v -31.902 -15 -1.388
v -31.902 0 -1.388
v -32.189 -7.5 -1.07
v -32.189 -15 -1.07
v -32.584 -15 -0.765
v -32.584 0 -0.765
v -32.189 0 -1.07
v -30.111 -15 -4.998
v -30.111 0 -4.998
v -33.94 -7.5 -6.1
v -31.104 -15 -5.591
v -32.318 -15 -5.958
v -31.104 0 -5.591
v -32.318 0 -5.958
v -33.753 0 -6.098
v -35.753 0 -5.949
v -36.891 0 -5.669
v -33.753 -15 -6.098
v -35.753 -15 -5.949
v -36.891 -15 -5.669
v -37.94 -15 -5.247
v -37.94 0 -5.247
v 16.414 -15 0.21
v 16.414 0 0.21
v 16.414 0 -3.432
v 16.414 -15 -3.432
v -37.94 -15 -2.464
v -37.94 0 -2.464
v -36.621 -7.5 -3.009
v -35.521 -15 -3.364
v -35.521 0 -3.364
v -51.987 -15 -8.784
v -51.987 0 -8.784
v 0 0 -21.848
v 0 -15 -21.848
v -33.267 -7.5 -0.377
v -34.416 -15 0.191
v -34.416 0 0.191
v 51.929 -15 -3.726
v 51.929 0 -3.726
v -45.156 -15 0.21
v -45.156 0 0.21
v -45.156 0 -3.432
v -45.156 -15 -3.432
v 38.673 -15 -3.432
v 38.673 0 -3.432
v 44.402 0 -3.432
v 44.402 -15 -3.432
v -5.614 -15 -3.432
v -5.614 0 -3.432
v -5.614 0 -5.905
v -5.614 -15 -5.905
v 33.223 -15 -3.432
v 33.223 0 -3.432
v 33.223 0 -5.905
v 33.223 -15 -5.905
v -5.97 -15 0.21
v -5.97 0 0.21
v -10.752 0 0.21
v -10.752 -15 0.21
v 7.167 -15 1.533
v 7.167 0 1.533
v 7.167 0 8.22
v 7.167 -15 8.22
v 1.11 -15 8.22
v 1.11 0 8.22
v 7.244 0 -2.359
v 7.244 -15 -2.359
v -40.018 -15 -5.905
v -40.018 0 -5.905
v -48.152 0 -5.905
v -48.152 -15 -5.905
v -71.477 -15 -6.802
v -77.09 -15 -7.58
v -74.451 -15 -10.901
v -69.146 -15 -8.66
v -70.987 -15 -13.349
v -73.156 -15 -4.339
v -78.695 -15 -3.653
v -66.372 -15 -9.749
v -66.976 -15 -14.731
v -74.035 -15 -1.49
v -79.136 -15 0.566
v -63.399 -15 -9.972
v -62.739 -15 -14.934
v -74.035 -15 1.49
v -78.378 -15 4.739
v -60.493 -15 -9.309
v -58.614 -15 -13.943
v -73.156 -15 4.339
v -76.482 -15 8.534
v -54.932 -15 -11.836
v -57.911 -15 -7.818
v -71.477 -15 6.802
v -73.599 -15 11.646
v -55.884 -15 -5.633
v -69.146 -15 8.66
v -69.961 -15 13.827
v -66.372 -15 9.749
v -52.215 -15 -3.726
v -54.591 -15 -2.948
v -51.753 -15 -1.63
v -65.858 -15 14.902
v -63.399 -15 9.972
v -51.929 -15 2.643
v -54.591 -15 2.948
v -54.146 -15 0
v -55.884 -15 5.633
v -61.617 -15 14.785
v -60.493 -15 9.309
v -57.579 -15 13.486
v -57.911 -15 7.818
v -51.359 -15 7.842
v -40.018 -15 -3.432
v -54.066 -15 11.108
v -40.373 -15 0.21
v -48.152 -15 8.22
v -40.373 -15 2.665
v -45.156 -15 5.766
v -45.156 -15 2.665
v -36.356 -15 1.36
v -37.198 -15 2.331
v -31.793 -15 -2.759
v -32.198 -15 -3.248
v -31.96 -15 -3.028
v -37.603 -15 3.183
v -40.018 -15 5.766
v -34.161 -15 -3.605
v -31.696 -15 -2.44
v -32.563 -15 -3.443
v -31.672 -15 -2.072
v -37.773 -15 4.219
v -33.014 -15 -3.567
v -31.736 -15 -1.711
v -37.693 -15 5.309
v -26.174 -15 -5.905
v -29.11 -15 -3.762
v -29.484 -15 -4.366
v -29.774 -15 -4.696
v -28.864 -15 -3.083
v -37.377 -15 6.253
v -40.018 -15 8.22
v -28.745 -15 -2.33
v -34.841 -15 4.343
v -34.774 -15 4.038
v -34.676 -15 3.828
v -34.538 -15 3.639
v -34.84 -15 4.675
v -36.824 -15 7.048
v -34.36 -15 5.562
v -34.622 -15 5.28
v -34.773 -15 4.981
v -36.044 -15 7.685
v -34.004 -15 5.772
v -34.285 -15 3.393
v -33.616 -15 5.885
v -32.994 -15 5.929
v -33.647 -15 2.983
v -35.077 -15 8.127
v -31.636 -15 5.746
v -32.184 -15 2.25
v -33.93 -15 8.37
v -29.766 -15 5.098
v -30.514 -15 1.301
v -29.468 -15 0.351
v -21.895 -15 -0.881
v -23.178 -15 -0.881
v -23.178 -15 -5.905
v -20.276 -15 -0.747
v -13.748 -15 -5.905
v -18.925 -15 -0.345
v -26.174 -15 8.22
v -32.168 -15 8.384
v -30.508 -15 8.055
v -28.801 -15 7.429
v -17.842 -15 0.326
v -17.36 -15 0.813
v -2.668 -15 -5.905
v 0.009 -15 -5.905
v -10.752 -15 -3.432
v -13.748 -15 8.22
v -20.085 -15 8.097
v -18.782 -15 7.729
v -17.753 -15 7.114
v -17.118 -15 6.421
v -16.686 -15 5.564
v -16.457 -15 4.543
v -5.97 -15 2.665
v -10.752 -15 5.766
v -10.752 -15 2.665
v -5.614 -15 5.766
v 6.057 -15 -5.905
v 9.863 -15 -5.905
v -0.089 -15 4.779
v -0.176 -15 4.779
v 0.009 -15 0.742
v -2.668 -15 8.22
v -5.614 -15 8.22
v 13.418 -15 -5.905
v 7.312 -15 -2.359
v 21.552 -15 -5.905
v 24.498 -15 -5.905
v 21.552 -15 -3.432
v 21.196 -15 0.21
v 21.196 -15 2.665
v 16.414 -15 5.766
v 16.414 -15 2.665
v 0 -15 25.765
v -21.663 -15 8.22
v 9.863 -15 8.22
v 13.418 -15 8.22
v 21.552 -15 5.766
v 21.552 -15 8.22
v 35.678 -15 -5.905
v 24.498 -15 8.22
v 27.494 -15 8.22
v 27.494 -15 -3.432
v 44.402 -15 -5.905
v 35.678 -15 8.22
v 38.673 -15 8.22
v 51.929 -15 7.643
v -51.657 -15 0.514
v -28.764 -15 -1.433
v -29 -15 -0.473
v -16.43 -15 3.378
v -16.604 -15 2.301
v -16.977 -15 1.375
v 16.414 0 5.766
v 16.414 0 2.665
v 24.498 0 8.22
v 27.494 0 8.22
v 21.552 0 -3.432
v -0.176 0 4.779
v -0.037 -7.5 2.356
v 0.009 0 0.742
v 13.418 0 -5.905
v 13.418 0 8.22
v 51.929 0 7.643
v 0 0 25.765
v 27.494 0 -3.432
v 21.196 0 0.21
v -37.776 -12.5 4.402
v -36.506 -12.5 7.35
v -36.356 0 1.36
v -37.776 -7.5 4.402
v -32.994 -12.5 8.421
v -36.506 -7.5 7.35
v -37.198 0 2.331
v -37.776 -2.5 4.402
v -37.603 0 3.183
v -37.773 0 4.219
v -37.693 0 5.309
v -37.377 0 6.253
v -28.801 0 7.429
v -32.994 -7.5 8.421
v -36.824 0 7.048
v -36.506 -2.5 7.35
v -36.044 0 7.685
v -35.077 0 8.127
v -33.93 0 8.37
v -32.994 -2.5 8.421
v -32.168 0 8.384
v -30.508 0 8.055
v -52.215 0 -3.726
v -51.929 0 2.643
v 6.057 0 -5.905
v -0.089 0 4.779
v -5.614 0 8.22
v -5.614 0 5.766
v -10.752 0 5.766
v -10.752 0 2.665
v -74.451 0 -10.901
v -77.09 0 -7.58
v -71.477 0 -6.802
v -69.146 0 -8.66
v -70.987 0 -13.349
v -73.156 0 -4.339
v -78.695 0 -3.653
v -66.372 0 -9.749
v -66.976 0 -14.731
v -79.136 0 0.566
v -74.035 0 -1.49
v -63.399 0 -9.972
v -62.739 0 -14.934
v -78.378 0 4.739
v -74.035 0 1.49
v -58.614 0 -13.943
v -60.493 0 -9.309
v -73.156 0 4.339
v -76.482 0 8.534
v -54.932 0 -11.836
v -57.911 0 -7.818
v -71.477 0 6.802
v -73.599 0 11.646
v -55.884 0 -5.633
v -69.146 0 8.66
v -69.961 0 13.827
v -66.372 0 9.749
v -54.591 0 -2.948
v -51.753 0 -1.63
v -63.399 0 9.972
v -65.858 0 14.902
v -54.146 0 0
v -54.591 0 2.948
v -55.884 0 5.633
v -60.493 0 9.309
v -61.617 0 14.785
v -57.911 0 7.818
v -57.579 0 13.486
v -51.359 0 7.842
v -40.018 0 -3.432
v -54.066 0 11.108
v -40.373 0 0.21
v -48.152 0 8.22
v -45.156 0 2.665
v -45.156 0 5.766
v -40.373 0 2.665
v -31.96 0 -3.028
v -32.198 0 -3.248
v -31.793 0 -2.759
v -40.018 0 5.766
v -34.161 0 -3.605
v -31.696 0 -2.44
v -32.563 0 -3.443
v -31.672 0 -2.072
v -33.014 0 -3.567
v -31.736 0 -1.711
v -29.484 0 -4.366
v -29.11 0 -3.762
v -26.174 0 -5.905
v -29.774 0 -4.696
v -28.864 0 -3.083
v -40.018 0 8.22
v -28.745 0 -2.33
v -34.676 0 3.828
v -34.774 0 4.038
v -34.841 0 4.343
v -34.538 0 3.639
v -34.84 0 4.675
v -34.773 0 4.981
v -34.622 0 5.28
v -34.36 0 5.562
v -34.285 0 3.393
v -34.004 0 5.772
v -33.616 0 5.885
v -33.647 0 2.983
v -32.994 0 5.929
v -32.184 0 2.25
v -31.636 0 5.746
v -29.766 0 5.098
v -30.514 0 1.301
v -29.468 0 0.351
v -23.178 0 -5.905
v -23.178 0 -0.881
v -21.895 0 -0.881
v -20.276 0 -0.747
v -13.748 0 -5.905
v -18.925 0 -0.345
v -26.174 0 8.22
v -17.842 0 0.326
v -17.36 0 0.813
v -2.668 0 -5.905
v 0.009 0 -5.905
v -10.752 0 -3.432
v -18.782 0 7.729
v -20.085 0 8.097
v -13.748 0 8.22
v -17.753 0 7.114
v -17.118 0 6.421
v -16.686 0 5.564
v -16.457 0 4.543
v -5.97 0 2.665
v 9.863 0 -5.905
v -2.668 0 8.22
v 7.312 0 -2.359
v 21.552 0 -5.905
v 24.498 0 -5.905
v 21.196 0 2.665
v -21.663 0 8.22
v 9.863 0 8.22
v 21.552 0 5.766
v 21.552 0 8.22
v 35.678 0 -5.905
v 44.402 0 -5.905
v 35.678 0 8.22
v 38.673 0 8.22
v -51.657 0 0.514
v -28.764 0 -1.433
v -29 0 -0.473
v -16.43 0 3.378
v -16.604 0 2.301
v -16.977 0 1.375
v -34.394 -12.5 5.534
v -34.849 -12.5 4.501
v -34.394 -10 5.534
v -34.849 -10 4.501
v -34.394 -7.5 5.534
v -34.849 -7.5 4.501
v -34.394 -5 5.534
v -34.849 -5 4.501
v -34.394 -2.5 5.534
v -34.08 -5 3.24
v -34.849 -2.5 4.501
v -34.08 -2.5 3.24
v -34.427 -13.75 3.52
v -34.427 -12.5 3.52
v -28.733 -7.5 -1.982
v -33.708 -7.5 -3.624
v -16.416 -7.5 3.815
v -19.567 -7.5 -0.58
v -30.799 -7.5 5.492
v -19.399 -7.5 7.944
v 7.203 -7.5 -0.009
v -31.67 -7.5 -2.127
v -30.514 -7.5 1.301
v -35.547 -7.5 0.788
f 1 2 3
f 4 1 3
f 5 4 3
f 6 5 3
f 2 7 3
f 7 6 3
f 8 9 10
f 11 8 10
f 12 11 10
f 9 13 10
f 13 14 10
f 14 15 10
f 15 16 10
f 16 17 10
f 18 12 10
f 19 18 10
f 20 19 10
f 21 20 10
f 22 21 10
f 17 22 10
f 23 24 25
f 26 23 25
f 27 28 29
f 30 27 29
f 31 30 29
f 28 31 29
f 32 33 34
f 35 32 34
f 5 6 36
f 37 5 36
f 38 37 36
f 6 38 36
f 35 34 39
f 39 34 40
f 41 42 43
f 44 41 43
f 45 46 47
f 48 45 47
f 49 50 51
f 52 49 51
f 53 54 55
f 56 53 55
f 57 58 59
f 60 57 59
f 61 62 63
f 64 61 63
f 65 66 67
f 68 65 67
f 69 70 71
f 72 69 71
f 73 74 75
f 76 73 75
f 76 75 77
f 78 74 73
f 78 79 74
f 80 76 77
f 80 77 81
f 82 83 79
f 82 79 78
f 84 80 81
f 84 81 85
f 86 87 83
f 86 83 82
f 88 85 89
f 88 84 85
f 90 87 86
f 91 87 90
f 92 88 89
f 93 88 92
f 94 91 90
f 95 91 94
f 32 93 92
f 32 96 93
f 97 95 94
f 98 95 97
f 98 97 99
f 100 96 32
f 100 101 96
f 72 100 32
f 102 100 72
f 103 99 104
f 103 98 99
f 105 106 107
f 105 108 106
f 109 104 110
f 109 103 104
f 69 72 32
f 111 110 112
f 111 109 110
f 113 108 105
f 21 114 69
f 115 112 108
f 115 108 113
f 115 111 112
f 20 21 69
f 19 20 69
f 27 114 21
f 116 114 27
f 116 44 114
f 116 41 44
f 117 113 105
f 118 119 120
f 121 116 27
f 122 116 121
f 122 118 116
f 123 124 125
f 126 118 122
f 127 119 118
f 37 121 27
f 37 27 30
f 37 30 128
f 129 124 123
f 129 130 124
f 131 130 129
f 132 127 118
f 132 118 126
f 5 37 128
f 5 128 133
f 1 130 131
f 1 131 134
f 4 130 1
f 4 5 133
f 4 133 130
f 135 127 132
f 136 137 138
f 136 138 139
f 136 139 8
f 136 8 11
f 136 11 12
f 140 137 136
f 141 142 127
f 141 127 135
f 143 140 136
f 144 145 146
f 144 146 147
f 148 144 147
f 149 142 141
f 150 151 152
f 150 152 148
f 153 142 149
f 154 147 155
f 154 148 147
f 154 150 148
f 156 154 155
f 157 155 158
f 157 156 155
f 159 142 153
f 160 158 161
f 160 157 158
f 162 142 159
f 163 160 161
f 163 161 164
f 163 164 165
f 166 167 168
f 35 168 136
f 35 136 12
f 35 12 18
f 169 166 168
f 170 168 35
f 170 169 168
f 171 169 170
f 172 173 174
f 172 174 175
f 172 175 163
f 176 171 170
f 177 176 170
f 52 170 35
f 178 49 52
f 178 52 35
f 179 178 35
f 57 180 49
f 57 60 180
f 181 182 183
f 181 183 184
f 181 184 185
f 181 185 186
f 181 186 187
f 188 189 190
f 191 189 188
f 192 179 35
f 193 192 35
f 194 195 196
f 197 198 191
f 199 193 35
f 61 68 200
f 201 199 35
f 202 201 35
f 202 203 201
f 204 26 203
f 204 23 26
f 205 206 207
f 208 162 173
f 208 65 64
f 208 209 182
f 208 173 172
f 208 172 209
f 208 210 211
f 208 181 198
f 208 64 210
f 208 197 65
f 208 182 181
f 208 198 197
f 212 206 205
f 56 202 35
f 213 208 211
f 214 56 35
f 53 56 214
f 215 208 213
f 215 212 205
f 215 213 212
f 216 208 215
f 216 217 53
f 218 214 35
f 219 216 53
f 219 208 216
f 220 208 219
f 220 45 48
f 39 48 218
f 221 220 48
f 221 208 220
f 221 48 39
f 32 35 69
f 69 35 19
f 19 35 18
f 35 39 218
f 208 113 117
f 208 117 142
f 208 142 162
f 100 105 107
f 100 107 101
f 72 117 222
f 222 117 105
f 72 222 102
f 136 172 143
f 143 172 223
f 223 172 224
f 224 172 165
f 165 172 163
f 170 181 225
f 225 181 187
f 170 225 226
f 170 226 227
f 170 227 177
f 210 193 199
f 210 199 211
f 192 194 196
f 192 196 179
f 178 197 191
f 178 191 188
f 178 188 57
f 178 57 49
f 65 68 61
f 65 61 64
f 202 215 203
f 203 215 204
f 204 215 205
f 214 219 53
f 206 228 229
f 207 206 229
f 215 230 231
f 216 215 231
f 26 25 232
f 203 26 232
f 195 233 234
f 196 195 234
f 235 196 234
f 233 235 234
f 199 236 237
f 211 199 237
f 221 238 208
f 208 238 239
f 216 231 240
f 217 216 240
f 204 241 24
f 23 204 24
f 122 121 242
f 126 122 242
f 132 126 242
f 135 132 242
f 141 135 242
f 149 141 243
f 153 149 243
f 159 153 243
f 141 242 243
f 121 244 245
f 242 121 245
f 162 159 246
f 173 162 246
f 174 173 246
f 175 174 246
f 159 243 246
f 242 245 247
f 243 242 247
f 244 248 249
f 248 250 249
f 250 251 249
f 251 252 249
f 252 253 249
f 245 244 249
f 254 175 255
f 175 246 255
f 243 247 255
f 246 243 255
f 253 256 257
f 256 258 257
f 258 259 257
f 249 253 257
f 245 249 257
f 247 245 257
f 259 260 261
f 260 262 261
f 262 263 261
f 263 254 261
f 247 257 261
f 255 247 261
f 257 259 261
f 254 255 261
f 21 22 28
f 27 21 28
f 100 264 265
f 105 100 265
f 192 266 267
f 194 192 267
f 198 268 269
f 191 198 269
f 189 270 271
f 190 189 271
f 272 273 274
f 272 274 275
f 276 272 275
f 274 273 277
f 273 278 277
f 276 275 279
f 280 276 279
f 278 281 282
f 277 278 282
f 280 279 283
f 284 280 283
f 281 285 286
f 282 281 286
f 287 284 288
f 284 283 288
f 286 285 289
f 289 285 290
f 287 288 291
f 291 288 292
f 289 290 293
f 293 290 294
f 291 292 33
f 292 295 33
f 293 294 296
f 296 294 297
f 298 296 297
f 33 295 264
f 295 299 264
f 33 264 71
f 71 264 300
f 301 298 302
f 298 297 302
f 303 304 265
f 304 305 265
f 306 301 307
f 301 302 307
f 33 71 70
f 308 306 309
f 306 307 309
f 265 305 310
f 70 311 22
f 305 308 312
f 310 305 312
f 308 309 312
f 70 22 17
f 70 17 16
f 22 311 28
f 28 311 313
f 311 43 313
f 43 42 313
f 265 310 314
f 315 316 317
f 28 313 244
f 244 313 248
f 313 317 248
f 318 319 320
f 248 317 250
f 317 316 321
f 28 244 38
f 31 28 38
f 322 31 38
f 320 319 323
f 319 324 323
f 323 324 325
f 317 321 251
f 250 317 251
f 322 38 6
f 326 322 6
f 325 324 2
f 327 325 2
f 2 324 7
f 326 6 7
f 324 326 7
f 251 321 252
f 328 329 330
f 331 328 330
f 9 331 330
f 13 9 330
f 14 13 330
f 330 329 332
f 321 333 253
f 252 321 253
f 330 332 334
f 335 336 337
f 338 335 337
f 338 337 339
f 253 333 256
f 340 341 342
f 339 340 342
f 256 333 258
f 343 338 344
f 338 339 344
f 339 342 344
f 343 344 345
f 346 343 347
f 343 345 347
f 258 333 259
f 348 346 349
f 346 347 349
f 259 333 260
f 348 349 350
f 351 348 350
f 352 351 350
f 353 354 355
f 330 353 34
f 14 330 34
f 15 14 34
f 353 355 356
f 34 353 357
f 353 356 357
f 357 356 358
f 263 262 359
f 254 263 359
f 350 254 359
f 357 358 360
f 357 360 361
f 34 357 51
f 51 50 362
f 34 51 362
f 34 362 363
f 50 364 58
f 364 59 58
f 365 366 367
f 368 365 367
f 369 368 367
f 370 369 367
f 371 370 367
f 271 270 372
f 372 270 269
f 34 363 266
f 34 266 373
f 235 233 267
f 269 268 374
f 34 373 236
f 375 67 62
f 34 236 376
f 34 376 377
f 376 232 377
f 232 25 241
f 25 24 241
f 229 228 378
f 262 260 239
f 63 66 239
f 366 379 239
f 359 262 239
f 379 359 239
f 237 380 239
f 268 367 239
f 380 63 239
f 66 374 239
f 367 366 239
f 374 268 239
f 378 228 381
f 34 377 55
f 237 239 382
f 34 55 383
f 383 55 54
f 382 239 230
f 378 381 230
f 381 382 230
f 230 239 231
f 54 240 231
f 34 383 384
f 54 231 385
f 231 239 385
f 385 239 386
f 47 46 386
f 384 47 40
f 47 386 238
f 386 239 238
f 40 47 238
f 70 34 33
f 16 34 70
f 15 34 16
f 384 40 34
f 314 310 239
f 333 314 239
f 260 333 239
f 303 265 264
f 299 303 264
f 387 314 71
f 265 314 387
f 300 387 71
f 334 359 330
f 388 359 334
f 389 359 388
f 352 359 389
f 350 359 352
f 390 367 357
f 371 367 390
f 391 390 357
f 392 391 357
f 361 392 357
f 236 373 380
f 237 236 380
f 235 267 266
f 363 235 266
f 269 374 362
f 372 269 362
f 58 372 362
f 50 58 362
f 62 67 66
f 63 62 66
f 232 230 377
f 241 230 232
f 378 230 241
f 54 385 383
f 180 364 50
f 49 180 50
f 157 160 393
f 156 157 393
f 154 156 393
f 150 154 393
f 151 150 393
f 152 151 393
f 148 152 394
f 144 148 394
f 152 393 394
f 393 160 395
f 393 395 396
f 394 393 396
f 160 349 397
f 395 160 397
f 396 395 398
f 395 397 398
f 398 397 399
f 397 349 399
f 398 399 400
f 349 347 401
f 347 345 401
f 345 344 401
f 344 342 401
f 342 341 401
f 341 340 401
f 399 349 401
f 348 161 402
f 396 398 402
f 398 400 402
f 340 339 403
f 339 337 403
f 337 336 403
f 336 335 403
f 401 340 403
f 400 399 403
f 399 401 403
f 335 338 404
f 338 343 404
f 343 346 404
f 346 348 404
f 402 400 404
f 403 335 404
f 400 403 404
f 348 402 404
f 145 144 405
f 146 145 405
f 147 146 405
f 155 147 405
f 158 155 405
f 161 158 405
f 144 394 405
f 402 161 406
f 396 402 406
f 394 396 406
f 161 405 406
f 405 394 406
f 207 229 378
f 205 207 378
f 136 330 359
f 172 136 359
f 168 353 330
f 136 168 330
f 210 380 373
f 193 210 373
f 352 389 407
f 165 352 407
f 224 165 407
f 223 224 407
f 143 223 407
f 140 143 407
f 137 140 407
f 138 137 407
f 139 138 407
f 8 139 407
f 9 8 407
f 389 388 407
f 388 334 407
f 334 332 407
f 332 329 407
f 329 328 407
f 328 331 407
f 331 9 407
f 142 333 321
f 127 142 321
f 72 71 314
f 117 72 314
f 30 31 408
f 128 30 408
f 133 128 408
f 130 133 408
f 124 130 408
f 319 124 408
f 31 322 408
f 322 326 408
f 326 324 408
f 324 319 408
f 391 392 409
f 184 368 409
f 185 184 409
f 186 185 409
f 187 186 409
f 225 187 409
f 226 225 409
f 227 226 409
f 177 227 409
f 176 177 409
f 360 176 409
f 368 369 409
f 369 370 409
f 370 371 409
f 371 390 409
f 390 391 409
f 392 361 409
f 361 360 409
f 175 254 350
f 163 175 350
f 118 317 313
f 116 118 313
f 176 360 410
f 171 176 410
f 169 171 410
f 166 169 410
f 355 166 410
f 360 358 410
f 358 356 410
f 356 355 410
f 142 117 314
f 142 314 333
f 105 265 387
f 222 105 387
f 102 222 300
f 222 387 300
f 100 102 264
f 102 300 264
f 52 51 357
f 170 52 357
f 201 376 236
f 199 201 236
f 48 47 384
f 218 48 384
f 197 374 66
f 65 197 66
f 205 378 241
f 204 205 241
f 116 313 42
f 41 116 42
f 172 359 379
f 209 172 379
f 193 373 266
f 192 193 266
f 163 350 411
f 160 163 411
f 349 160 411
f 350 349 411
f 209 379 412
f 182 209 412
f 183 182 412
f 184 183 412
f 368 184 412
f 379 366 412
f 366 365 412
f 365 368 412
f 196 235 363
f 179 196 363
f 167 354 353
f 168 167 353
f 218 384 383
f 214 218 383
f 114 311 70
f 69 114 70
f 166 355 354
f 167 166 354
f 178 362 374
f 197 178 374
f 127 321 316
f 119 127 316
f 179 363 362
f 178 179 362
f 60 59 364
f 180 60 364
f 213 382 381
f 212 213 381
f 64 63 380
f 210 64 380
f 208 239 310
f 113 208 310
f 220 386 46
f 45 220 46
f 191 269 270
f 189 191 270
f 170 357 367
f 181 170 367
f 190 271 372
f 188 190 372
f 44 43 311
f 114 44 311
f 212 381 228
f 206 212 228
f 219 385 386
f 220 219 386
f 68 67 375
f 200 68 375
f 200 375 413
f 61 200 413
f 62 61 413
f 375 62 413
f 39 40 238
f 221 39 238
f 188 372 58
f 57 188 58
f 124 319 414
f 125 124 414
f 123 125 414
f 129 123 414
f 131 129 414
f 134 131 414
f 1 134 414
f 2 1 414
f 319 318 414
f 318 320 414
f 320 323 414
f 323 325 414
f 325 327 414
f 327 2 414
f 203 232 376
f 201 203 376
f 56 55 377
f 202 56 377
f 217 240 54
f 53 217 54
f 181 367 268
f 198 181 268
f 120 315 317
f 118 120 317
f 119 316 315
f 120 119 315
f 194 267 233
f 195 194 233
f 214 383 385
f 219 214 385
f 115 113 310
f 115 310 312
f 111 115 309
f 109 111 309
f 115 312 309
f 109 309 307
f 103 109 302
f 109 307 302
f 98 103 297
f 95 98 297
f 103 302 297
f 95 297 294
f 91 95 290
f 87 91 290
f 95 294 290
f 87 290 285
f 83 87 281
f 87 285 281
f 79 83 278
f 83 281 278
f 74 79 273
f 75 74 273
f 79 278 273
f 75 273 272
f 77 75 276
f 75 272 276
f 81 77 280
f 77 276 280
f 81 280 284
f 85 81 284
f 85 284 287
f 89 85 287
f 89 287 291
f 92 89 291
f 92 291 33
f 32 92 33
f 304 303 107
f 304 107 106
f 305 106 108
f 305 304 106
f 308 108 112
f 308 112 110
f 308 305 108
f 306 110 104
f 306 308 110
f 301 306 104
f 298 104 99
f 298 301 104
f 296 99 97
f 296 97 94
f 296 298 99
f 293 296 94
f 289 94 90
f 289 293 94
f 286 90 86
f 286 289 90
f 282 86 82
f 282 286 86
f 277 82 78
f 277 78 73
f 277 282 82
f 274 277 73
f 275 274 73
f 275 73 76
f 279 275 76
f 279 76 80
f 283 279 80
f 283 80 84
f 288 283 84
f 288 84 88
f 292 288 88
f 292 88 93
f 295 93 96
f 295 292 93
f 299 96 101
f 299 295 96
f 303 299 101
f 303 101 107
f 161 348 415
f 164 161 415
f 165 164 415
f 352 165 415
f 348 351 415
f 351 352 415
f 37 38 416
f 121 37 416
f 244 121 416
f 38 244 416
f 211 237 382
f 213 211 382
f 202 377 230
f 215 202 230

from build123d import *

# Parameters (mm, degrees)
F0_R     = 10
F1_DEPTH = 15


with BuildPart() as f1:
    # F0 (on Front) → F1 (new body)
    with BuildSketch(Plane.XZ):
        with BuildLine():
            ThreePointArc((-51.9289774608, 2.6432993809), (-51.6588535234, -0.5600733653), (-52.2146643877, -3.726402182))
            Line((-52.2146643877, -3.726402182), (-52.2146643877, -8.726402182))
            Line((-52.2146643877, -8.726402182), (-51.9870151319, -8.7836093454))
            ThreePointArc((-51.9870151319, -8.7836093454), (-49.874136957, -4.6157733907), (-49.1462999327, 0))
            ThreePointArc((-49.1462999327, 0), (-49.7101962212, 4.0741759452), (-51.3594878837, 7.8420301978))
            Line((-51.3594878837, 7.8420301978), (-51.9289774608, 7.6432993809))
            Line((-51.9289774608, 7.6432993809), (-51.9289774608, 2.6432993809))
        make_face()
        with BuildLine():
            Line((-52.2146643877, -8.726402182), (-52.2146643877, -3.726402182))
            Line((-52.2146643877, -3.726402182), (-51.9289774608, 2.6432993809))
            Line((-51.9289774608, 2.6432993809), (-51.9289774608, 7.6432993809))
            Line((-51.9289774608, 7.6432993809), (-51.3594878837, 7.8420301978))
            ThreePointArc((-51.3594878837, 7.8420301978), (-79.1356264541, 0.565765353), (-51.9870151319, -8.7836093454))
            Line((-51.9870151319, -8.7836093454), (-52.2146643877, -8.726402182))
        make_face()
        with Locations((-64.1462999327, 0)):
            Circle(F0_R, mode=Mode.SUBTRACT)
        with BuildLine():
            ThreePointArc((-49.1462999327, 0), (-49.874136957, -4.6157733907), (-51.9870151319, -8.7836093454))
            Line((-51.9870151319, -8.7836093454), (0, -21.8476962826))
            Line((0, -21.8476962826), (51.9289774608, -3.726402182))
            Line((51.9289774608, -3.726402182), (51.9289774608, 7.6432993809))
            Line((51.9289774608, 7.6432993809), (0, 25.7645934815))
            Line((0, 25.7645934815), (-51.3594878837, 7.8420301978))
            ThreePointArc((-51.3594878837, 7.8420301978), (-49.7101962212, 4.0741759452), (-49.1462999327, 0))
        make_face()
        Polygon((-40.0178585444, -3.4319313488), (-40.0178585444, -5.9052360061), (-48.1519392362, -5.9052360061), (-48.1519392362, 8.2204252181), (-40.0178585444, 8.2204252181), (-40.0178585444, 5.7656703457), (-45.15614897, 5.7656703457), (-45.15614897, 2.6647646316), (-40.3733960889, 2.6647646316), (-40.3733960889, 0.2100097592), (-45.15614897, 0.2100097592), (-45.15614897, -3.4319313488), align=None, mode=Mode.SUBTRACT)
        with BuildLine():
            add(Edge.make_bspline(
                [(-29.4676683654, 0.3506789616), (-28.7334060453, -0.5999975161), (-28.7334060453, -1.9819564934)],
                knots=[0, 0, 0, 1, 1, 1], degree=2))
            add(Edge.make_bspline(
                [(-28.7334060453, -1.9819564934), (-28.7334060453, -3.895675972), (-30.1107275763, -4.9978423599)],
                knots=[0, 0, 0, 1, 1, 1], degree=2))
            add(Edge.make_bspline(
                [(-30.1107275763, -4.9978423599), (-31.4880491074, -6.1000087479), (-33.939712349, -6.1000087479)],
                knots=[0, 0, 0, 1, 1, 1], degree=2))
            add(Edge.make_bspline(
                [(-33.939712349, -6.1000087479), (-36.2027861105, -6.1000087479), (-37.9402826322, -5.2467186411)],
                knots=[0, 0, 0, 1, 1, 1], degree=2))
            Line((-37.9402826322, -5.2467186411), (-37.9402826322, -2.4642509016))
            add(Edge.make_bspline(
                [(-37.9402826322, -2.4642509016), (-36.5119491926, -3.1042184817), (-35.5210815143, -3.3639154707)],
                knots=[0, 0, 0, 1, 1, 1], degree=2))
            add(Edge.make_bspline(
                [(-35.5210815143, -3.3639154707), (-34.5302138359, -3.6236124597), (-33.7078400374, -3.6236124597)],
                knots=[0, 0, 0, 1, 1, 1], degree=2))
            add(Edge.make_bspline(
                [(-33.7078400374, -3.6236124597), (-32.7247014361, -3.6236124597), (-32.197578381, -3.2479793149)],
                knots=[0, 0, 0, 1, 1, 1], degree=2))
            add(Edge.make_bspline(
                [(-32.197578381, -3.2479793149), (-31.6704553259, -2.87234617), (-31.6704553259, -2.127263142)],
                knots=[0, 0, 0, 1, 1, 1], degree=2))
            add(Edge.make_bspline(
                [(-31.6704553259, -2.127263142), (-31.6704553259, -1.7129846119), (-31.9023276375, -1.3883633756)],
                knots=[0, 0, 0, 1, 1, 1], degree=2))
            add(Edge.make_bspline(
                [(-31.9023276375, -1.3883633756), (-32.1341999491, -1.0637421394), (-32.5840322337, -0.7653997651)],
                knots=[0, 0, 0, 1, 1, 1], degree=2))
            add(Edge.make_bspline(
                [(-32.5840322337, -0.7653997651), (-33.0338645182, -0.4670573908), (-34.4158234955, 0.1914599742)],
                knots=[0, 0, 0, 1, 1, 1], degree=2))
            add(Edge.make_bspline(
                [(-34.4158234955, 0.1914599742), (-35.708125179, 0.8005112461), (-36.3558218361, 1.3600964248)],
                knots=[0, 0, 0, 1, 1, 1], degree=2))
            add(Edge.make_bspline(
                [(-36.3558218361, 1.3600964248), (-37.0035184933, 1.9196816036), (-37.389972346, 2.6647646316)],
                knots=[0, 0, 0, 1, 1, 1], degree=2))
            add(Edge.make_bspline(
                [(-37.389972346, 2.6647646316), (-37.7764261987, 3.4098476596), (-37.7764261987, 4.4022611534)],
                knots=[0, 0, 0, 1, 1, 1], degree=2))
            add(Edge.make_bspline(
                [(-37.7764261987, 4.4022611534), (-37.7764261987, 6.2788810621), (-36.505765931, 7.3501311418)],
                knots=[0, 0, 0, 1, 1, 1], degree=2))
            add(Edge.make_bspline(
                [(-36.505765931, 7.3501311418), (-35.2351056633, 8.4213812215), (-32.9936733176, 8.4213812215)],
                knots=[0, 0, 0, 1, 1, 1], degree=2))
            add(Edge.make_bspline(
                [(-32.9936733176, 8.4213812215), (-31.893052745, 8.4213812215), (-30.8929101742, 8.1616842325)],
                knots=[0, 0, 0, 1, 1, 1], degree=2))
            add(Edge.make_bspline(
                [(-30.8929101742, 8.1616842325), (-29.8927676034, 7.9019872435), (-28.8014219234, 7.4289677278)],
                knots=[0, 0, 0, 1, 1, 1], degree=2))
            Line((-28.8014219234, 7.4289677278), (-29.7660107397, 5.0978780882))
            add(Edge.make_bspline(
                [(-29.7660107397, 5.0978780882), (-30.8975476205, 5.5616227115), (-31.6364473868, 5.7455747454)],
                knots=[0, 0, 0, 1, 1, 1], degree=2))
            add(Edge.make_bspline(
                [(-31.6364473868, 5.7455747454), (-32.3753471532, 5.9295267793), (-33.089513873, 5.9295267793)],
                knots=[0, 0, 0, 1, 1, 1], degree=2))
            add(Edge.make_bspline(
                [(-33.089513873, 5.9295267793), (-33.939712349, 5.9295267793), (-34.3941820798, 5.5337980341)],
                knots=[0, 0, 0, 1, 1, 1], degree=2))
            add(Edge.make_bspline(
                [(-34.3941820798, 5.5337980341), (-34.8486518106, 5.1380692889), (-34.8486518106, 4.5011933396)],
                knots=[0, 0, 0, 1, 1, 1], degree=2))
            add(Edge.make_bspline(
                [(-34.8486518106, 4.5011933396), (-34.8486518106, 4.1054645945), (-34.6646997767, 3.810213851)],
                knots=[0, 0, 0, 1, 1, 1], degree=2))
            add(Edge.make_bspline(
                [(-34.6646997767, 3.810213851), (-34.4807477428, 3.5149631075), (-34.0803815514, 3.2398079644)],
                knots=[0, 0, 0, 1, 1, 1], degree=2))
            add(Edge.make_bspline(
                [(-34.0803815514, 3.2398079644), (-33.68001536, 2.9646528213), (-32.1836660423, 2.2504861015)],
                knots=[0, 0, 0, 1, 1, 1], degree=2))
            add(Edge.make_bspline(
                [(-32.1836660423, 2.2504861015), (-30.2019306856, 1.3013554392), (-29.4676683654, 0.3506789616)],
                knots=[0, 0, 0, 1, 1, 1], degree=2))
        make_face(mode=Mode.SUBTRACT)
        with BuildLine():
            add(Edge.make_bspline(
                [(-17.7534791821, 7.113621384), (-16.4163488518, 6.0068175498), (-16.4163488518, 3.8148512972)],
                knots=[0, 0, 0, 1, 1, 1], degree=2))
            add(Edge.make_bspline(
                [(-16.4163488518, 3.8148512972), (-16.4163488518, 1.5332277508), (-17.8415906605, 0.325945915)],
                knots=[0, 0, 0, 1, 1, 1], degree=2))
            add(Edge.make_bspline(
                [(-17.8415906605, 0.325945915), (-19.2668324693, -0.8813359209), (-21.8947186678, -0.8813359209)],
                knots=[0, 0, 0, 1, 1, 1], degree=2))
            Line((-21.8947186678, -0.8813359209), (-23.1777454587, -0.8813359209))
            Line((-23.1777454587, -0.8813359209), (-23.1777454587, -5.9052360061))
            Line((-23.1777454587, -5.9052360061), (-26.1735357249, -5.9052360061))
            Line((-26.1735357249, -5.9052360061), (-26.1735357249, 8.2204252181))
            Line((-26.1735357249, 8.2204252181), (-21.6628463561, 8.2204252181))
            add(Edge.make_bspline(
                [(-21.6628463561, 8.2204252181), (-19.0906095125, 8.2204252181), (-17.7534791821, 7.113621384)],
                knots=[0, 0, 0, 1, 1, 1], degree=2))
        make_face(mode=Mode.SUBTRACT)
        Polygon((-5.6141907608, -3.4319313488), (-5.6141907608, -5.9052360061), (-13.7482714526, -5.9052360061), (-13.7482714526, 8.2204252181), (-5.6141907608, 8.2204252181), (-5.6141907608, 5.7656703457), (-10.7524811864, 5.7656703457), (-10.7524811864, 2.6647646316), (-5.9697283053, 2.6647646316), (-5.9697283053, 0.2100097592), (-10.7524811864, 0.2100097592), (-10.7524811864, -3.4319313488), align=None, mode=Mode.SUBTRACT)
        with BuildLine():
            Line((9.8625131325, 8.2204252181), (9.8625131325, -5.9052360061))
            Line((9.8625131325, -5.9052360061), (6.056715591, -5.9052360061))
            Line((6.056715591, -5.9052360061), (-0.0894464825, 4.7794401136))
            Line((-0.0894464825, 4.7794401136), (-0.1760121455, 4.7794401136))
            add(Edge.make_bspline(
                [(-0.1760121455, 4.7794401136), (0.0094857038, 1.9505979118), (0.0094857038, 0.7417702605)],
                knots=[0, 0, 0, 1, 1, 1], degree=2))
            Line((0.0094857038, 0.7417702605), (0.0094857038, -5.9052360061))
            Line((0.0094857038, -5.9052360061), (-2.6678665878, -5.9052360061))
            Line((-2.6678665878, -5.9052360061), (-2.6678665878, 8.2204252181))
            Line((-2.6678665878, 8.2204252181), (1.1101062763, 8.2204252181))
            Line((1.1101062763, 8.2204252181), (7.2439018265, -2.3591354536))
            Line((7.2439018265, -2.3591354536), (7.3119177046, -2.3591354536))
            add(Edge.make_bspline(
                [(7.3119177046, -2.3591354536), (7.166611056, 0.3955076085), (7.166611056, 1.5332277508)],
                knots=[0, 0, 0, 1, 1, 1], degree=2))
            Line((7.166611056, 1.5332277508), (7.166611056, 8.2204252181))
            Line((7.166611056, 8.2204252181), (9.8625131325, 8.2204252181))
        make_face(mode=Mode.SUBTRACT)
        Polygon((21.5519692692, -3.4319313488), (21.5519692692, -5.9052360061), (13.4178885774, -5.9052360061), (13.4178885774, 8.2204252181), (21.5519692692, 8.2204252181), (21.5519692692, 5.7656703457), (16.4136788436, 5.7656703457), (16.4136788436, 2.6647646316), (21.1964317247, 2.6647646316), (21.1964317247, 0.2100097592), (16.4136788436, 0.2100097592), (16.4136788436, -3.4319313488), align=None, mode=Mode.SUBTRACT)
        Polygon((33.222875621, -5.9052360061), (24.4982934423, -5.9052360061), (24.4982934423, 8.2204252181), (27.4940837085, 8.2204252181), (27.4940837085, -3.4319313488), (33.222875621, -3.4319313488), align=None, mode=Mode.SUBTRACT)
        Polygon((44.4022126722, -5.9052360061), (35.6776304934, -5.9052360061), (35.6776304934, 8.2204252181), (38.6734207596, 8.2204252181), (38.6734207596, -3.4319313488), (44.4022126722, -3.4319313488), align=None, mode=Mode.SUBTRACT)
    extrude(amount=F1_DEPTH)


solid = f1.part
